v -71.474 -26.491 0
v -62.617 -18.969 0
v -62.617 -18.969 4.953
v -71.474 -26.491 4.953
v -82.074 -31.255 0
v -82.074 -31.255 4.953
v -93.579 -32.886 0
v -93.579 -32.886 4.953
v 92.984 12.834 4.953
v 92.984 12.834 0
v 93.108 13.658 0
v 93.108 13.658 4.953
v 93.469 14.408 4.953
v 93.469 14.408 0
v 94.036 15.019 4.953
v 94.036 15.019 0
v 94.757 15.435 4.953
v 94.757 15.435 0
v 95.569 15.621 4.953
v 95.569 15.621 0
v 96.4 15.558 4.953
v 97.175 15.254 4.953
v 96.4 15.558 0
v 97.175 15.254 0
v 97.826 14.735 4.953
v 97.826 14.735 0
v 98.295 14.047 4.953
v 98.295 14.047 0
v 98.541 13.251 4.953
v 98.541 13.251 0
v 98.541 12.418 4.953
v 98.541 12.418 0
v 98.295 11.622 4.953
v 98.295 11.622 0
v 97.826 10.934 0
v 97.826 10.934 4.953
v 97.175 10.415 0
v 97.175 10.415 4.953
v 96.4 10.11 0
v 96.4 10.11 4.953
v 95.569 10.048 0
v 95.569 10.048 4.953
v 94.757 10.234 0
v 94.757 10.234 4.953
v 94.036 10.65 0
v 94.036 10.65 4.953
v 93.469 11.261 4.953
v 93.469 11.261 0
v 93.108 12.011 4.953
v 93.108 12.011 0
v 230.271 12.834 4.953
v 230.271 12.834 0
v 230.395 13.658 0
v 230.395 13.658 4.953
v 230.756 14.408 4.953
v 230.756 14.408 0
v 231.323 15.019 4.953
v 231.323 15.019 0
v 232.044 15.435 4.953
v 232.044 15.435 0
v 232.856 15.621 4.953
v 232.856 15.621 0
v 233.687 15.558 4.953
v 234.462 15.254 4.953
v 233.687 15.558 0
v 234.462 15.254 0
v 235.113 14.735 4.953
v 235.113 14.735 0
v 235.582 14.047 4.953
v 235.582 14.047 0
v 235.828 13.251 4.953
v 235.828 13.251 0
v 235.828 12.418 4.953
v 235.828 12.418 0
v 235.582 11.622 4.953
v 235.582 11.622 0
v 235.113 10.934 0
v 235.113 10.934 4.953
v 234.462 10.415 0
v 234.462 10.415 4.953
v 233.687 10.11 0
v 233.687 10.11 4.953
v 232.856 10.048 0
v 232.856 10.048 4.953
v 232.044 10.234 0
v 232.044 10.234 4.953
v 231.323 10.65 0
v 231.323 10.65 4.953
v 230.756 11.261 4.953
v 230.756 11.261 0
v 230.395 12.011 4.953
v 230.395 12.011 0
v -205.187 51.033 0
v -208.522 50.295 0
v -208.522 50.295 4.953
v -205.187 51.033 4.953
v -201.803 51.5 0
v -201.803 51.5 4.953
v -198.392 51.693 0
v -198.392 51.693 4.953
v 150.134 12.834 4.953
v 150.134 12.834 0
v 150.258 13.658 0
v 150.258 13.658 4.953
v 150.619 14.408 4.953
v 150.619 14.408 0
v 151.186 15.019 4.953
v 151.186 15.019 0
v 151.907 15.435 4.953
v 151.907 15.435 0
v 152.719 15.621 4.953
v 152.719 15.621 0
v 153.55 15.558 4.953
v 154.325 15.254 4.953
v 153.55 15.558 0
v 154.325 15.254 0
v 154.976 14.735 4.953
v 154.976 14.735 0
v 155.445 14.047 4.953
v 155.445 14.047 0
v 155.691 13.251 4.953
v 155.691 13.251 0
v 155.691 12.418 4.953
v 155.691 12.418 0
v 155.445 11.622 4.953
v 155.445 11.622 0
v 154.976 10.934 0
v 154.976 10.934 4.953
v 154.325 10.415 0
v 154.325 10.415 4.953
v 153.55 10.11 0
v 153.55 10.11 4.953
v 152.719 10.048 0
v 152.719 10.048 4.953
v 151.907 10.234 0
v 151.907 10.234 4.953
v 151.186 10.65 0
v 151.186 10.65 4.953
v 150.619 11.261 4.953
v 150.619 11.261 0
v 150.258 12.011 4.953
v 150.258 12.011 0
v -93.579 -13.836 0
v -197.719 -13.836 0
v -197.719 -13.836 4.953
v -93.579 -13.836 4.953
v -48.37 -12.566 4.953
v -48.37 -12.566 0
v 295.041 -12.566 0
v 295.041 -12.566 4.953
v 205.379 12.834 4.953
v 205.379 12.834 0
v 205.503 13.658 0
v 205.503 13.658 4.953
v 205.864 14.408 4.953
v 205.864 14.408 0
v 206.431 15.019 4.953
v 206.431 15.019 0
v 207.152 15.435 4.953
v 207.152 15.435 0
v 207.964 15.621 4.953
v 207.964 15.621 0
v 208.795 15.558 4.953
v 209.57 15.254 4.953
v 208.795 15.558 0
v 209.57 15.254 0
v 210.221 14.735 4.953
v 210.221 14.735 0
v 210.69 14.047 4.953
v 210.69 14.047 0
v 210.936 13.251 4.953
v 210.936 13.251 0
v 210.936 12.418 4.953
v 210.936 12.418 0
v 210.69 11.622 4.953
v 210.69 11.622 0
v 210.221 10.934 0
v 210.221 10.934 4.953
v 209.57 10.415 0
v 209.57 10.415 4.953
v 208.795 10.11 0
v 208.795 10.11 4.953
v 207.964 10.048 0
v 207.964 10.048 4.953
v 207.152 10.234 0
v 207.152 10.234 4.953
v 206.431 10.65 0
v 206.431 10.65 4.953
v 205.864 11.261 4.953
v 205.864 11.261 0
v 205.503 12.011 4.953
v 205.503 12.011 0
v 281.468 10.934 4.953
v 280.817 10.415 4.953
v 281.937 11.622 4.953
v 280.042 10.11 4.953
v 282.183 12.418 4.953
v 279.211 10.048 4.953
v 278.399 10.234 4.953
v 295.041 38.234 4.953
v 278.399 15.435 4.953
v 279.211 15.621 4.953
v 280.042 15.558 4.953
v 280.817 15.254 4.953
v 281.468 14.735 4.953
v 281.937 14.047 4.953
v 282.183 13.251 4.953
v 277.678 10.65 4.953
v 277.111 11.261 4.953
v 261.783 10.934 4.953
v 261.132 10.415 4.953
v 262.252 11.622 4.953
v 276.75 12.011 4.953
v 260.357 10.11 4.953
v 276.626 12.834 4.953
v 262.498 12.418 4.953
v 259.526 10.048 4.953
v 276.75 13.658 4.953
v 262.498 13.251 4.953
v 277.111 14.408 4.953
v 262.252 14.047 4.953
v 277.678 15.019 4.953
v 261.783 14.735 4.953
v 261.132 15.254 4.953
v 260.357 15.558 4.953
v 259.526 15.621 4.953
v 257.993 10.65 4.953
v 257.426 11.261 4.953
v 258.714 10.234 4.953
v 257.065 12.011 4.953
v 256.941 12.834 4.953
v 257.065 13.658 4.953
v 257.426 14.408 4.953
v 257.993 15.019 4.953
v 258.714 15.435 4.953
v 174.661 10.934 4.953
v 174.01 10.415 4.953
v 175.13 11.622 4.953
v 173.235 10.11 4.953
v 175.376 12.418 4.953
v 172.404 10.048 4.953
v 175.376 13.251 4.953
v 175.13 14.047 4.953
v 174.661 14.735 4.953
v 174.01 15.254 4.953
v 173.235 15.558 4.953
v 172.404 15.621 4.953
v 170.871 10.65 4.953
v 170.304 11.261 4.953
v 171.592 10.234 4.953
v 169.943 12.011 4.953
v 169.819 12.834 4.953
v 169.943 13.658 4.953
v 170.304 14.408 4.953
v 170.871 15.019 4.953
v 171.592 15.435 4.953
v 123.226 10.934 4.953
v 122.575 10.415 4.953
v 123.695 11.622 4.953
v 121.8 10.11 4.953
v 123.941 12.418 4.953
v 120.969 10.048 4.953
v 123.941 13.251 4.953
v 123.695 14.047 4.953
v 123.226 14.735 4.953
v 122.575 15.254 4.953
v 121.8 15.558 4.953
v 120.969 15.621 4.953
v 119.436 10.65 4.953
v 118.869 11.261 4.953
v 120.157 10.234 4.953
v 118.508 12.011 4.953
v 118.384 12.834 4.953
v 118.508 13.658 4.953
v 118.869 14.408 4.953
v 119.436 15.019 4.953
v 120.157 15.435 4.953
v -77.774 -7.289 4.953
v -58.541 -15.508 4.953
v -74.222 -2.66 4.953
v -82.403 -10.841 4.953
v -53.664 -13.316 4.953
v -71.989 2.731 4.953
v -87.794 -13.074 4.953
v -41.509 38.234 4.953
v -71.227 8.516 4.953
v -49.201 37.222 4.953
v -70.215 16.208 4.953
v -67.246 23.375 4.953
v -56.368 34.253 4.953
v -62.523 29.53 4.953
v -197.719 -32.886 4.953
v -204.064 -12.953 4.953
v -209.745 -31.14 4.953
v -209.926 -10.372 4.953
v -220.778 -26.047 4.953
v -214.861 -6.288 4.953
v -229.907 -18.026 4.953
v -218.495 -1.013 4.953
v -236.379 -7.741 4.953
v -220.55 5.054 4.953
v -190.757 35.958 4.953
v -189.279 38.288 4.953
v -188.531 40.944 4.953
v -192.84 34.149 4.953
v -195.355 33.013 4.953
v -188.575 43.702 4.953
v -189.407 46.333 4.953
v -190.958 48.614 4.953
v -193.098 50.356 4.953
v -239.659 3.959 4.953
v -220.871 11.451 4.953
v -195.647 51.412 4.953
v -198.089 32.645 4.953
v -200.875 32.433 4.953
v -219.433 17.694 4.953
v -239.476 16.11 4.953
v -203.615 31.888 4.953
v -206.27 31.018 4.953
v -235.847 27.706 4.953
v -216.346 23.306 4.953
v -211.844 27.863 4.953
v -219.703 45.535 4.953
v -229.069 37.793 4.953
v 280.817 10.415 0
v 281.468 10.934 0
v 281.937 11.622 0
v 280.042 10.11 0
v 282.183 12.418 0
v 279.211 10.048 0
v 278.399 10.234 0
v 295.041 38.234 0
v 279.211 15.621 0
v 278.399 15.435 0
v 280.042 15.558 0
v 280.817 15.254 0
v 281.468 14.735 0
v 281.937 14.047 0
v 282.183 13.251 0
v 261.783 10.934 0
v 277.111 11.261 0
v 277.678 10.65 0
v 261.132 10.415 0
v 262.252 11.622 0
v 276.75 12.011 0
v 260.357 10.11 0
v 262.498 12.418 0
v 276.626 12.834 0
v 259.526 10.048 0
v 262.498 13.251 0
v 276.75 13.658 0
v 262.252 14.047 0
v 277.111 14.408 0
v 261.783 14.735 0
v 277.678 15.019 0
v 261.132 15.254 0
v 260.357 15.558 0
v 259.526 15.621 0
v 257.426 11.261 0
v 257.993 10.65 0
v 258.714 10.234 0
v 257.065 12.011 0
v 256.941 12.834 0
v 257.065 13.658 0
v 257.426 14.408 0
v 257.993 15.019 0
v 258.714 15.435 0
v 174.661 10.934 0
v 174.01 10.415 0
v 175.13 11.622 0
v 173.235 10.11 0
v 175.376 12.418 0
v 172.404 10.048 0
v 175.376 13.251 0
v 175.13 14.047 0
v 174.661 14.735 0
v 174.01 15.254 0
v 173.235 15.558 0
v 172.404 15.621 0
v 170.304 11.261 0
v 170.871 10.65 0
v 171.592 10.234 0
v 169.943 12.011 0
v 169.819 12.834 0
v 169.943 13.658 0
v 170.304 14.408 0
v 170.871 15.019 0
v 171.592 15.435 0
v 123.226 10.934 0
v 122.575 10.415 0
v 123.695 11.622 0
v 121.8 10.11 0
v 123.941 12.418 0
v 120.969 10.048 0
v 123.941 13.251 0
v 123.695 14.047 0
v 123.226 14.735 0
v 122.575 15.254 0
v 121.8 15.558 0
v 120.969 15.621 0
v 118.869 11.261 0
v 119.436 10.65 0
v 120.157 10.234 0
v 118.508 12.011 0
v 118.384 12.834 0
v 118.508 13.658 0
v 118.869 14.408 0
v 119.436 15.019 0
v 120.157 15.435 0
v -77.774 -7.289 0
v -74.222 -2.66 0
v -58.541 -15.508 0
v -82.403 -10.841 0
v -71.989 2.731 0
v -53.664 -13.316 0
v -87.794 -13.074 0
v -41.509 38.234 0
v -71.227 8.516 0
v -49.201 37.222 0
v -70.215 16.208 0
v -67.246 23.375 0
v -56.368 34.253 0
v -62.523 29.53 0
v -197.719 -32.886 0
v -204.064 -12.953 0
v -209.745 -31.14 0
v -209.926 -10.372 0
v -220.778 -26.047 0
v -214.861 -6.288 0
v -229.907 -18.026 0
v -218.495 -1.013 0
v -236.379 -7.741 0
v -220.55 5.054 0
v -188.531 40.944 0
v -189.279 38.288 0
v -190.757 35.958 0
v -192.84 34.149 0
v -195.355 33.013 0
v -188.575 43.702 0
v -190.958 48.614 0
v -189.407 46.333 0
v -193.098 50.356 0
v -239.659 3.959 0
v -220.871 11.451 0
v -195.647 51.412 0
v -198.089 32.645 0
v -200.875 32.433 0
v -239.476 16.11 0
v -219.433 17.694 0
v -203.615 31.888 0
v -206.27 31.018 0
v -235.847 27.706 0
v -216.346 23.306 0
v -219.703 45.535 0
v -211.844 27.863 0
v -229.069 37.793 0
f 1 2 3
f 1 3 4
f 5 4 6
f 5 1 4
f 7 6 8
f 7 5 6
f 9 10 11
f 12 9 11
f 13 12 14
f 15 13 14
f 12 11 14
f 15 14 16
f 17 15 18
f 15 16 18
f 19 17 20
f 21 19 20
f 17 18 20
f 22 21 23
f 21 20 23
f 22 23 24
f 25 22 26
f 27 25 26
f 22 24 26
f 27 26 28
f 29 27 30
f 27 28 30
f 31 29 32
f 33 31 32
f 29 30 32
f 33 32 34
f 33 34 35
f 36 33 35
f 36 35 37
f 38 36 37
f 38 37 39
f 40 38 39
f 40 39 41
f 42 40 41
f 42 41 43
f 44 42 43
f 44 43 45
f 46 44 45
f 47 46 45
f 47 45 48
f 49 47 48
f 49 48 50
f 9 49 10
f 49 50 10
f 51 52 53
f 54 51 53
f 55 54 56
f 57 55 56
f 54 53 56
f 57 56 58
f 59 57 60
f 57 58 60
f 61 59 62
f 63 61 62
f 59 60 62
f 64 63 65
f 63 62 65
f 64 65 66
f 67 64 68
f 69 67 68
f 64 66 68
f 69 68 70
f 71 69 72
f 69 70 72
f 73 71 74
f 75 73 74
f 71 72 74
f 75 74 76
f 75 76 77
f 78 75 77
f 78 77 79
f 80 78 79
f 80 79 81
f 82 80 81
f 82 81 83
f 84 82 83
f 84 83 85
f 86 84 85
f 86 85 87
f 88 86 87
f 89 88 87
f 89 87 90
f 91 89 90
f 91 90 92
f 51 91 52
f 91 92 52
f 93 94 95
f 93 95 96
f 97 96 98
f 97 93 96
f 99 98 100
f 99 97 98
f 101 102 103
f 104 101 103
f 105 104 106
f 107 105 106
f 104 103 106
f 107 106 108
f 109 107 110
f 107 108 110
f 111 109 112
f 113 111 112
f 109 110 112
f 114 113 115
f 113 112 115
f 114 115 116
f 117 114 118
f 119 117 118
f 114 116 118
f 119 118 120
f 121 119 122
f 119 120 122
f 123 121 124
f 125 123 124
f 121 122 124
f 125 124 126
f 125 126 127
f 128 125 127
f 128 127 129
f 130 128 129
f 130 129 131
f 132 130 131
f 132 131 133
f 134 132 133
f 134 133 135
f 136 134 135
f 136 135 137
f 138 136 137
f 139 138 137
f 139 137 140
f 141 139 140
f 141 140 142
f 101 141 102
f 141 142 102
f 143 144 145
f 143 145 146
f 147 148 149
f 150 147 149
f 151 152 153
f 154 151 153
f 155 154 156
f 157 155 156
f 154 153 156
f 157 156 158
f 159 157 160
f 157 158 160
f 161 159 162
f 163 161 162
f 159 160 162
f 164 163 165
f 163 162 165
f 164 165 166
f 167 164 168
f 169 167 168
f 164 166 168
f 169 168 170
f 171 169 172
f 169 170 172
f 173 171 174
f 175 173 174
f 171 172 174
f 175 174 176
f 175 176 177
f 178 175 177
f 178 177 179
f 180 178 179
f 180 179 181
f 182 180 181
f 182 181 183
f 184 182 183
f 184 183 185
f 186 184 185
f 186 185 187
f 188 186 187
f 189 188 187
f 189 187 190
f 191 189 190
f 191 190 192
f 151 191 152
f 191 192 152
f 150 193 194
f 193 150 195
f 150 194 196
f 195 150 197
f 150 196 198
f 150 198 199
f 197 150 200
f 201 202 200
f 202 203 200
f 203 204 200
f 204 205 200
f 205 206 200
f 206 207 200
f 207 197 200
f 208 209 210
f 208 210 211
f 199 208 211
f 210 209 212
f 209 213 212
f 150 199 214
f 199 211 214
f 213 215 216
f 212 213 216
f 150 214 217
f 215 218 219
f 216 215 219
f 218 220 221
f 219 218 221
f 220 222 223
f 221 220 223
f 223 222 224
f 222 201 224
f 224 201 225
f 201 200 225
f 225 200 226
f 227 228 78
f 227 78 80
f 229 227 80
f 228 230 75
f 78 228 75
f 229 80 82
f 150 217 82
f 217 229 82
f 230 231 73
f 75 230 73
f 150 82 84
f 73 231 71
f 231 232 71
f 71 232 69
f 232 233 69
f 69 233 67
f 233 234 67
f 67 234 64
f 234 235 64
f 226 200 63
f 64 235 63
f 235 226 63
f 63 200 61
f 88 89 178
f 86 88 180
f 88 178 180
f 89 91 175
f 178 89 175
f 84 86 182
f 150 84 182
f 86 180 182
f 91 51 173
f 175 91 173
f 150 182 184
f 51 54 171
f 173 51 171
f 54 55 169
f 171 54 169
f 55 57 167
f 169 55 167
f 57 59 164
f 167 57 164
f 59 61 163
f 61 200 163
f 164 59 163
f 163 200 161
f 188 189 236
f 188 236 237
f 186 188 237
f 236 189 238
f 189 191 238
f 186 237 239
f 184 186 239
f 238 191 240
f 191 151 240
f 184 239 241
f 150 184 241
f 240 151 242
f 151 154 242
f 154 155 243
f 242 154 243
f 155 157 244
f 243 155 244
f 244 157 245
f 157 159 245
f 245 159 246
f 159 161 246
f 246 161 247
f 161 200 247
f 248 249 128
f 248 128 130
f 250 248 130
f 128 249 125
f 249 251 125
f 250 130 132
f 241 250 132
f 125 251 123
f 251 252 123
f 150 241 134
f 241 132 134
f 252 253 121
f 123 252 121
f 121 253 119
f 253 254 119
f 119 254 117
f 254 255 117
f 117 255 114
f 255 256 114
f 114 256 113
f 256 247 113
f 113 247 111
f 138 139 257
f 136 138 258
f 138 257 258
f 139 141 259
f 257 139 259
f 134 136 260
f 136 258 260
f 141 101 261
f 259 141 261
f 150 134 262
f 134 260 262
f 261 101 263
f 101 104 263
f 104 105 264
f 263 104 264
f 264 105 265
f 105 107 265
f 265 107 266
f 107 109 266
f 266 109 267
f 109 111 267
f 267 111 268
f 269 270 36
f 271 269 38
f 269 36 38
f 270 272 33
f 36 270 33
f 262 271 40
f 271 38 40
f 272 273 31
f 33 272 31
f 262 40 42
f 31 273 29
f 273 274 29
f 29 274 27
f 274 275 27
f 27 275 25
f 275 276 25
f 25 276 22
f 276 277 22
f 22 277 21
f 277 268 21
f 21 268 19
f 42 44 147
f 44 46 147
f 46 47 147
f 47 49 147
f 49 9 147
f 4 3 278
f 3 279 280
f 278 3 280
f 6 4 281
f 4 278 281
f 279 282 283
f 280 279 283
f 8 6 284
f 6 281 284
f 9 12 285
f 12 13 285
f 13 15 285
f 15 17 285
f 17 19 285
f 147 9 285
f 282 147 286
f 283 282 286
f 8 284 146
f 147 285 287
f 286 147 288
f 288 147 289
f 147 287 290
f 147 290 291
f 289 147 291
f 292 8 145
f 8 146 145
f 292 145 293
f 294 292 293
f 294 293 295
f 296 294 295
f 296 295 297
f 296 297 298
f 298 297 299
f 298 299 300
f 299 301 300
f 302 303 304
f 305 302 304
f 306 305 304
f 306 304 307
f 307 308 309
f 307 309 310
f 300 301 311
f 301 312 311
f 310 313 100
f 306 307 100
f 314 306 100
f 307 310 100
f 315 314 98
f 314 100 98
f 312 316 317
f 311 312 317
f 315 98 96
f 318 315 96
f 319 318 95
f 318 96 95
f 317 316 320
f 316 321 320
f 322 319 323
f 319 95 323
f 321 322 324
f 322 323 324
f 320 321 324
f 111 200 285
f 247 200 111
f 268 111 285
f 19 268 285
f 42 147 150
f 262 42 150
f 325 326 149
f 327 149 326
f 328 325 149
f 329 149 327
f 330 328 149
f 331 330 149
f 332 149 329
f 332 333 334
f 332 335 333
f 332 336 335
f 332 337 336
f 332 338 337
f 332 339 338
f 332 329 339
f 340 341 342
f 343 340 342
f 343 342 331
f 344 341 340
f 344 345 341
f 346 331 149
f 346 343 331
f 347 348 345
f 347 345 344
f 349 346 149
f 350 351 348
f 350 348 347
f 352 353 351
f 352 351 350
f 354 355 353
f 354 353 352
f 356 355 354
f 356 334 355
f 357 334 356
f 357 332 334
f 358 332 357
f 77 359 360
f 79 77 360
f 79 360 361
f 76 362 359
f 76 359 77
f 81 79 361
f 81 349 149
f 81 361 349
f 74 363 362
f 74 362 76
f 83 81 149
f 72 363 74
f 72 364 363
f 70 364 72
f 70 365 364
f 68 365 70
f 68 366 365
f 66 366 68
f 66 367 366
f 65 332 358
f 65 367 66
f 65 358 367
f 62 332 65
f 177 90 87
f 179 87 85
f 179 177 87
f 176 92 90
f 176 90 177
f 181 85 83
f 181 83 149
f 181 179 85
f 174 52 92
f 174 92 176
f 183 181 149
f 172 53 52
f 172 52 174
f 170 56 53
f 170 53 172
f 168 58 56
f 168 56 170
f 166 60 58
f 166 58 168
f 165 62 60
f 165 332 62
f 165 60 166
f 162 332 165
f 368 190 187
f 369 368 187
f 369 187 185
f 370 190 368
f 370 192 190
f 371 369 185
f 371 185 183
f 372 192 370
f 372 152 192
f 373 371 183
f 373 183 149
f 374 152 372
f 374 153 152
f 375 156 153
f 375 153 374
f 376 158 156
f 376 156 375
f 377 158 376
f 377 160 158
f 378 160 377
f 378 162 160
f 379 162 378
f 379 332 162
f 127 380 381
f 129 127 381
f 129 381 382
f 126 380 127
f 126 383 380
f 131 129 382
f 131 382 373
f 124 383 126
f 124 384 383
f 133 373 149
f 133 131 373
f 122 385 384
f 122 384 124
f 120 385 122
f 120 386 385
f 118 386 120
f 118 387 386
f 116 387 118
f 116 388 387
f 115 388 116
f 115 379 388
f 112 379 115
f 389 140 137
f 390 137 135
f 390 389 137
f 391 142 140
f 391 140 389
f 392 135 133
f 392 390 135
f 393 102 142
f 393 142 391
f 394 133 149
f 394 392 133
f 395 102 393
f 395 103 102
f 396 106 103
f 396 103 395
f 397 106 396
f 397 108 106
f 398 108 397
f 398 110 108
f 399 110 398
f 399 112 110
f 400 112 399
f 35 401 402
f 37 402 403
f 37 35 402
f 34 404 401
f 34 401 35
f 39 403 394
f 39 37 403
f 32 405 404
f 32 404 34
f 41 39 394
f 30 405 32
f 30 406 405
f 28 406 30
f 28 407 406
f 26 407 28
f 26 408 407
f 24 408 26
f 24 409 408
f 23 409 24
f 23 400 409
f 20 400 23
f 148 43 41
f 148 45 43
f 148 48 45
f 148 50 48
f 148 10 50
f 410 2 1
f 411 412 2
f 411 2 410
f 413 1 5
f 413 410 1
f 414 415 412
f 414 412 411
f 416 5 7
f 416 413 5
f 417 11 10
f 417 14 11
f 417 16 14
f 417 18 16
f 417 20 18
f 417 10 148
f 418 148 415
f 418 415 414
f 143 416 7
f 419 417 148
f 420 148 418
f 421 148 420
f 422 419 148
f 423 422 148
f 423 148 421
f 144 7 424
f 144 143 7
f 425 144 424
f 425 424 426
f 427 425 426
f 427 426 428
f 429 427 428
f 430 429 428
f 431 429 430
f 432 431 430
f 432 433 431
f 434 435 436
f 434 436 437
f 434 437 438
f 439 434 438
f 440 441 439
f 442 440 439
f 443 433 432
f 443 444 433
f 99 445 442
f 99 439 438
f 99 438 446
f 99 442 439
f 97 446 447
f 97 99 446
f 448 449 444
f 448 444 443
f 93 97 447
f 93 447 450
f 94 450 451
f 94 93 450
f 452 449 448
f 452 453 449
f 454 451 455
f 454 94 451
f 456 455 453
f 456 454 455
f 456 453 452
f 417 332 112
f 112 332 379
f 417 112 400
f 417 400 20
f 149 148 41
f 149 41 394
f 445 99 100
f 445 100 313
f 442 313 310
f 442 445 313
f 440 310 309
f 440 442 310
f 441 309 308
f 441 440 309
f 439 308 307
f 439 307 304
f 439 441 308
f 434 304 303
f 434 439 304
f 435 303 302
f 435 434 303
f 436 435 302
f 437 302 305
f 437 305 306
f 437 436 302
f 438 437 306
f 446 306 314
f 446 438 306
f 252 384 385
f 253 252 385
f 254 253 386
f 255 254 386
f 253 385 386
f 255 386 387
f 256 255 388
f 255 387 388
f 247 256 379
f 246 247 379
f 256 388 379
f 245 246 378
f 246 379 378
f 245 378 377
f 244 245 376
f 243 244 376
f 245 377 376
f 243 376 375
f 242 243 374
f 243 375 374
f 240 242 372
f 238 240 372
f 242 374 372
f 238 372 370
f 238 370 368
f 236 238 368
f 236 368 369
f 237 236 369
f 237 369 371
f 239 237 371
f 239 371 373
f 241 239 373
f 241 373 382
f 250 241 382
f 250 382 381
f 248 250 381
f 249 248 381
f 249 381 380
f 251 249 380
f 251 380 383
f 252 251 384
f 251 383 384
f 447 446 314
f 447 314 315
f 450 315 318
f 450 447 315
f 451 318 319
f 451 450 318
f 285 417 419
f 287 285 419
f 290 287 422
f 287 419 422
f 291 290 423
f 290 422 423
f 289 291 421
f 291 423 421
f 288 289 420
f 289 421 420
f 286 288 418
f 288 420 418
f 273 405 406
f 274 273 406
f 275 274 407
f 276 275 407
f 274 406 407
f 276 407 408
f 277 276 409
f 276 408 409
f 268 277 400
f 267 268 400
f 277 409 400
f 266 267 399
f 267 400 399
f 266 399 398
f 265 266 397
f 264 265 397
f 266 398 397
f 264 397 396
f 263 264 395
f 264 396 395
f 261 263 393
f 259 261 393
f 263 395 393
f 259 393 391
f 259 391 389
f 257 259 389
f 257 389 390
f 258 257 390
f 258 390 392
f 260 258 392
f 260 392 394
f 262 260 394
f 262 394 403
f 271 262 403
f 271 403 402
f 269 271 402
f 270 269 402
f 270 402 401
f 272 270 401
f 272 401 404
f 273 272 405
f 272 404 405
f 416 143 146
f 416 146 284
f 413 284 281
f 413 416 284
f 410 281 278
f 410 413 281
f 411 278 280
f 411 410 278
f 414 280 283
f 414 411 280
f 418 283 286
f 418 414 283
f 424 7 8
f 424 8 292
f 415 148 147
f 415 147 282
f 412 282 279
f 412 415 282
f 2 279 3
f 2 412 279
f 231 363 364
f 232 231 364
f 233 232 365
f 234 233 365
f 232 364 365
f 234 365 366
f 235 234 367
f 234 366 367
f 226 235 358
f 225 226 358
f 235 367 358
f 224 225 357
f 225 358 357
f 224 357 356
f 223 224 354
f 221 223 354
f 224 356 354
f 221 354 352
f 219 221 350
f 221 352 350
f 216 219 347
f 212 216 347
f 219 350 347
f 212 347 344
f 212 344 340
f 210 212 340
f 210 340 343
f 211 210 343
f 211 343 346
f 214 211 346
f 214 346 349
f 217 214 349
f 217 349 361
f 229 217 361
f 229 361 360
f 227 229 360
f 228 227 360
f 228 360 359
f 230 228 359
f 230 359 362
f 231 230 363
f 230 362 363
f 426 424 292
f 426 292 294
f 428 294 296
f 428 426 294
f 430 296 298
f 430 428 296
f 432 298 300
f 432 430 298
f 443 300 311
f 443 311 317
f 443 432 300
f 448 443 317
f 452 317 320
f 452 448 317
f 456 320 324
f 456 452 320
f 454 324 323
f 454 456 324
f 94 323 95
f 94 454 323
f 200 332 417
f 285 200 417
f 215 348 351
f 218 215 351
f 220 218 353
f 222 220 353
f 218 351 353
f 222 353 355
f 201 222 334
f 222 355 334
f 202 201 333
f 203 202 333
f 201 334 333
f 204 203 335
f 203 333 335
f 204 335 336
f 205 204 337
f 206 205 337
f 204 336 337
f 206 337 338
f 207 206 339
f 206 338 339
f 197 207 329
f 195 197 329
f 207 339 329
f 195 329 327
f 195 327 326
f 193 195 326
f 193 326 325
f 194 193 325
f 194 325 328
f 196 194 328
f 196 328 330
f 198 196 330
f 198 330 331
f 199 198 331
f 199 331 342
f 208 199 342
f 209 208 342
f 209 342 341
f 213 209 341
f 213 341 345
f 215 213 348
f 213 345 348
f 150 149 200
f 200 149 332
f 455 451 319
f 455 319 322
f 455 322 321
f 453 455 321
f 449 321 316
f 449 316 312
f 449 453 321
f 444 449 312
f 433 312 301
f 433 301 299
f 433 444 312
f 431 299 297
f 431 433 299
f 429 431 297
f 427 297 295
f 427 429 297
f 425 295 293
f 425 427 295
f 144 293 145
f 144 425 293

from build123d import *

# Parameters (mm, degrees)
BOSS_EXTRUDE1_DEPTH = 4.953
SKETCH4_W           = 52.07
SKETCH4_H           = 19.05
SKETCH4_R           = 9.528566475
BOSS_EXTRUDE4_DEPTH = 4.953
SKETCH5_R           = 2.794
CUT_EXTRUDE1_DEPTH  = 4.953


with BuildPart() as part:
    # Sketch1 → Boss-Extrude1 (new body)
    with BuildSketch(Plane.XY):
        with BuildLine():
            Line((-41.509205492, 38.23442277), (-41.509205492, -12.56557723))
            Line((-41.509205492, -12.56557723), (-20.563828914, -12.56557723))
            ThreePointArc((-20.563828914, -12.56557723), (-14.071874854, -2.900775285), (-11.791205492, 8.51642277))
            ThreePointArc((-11.791205492, 8.51642277), (-20.495406169, 29.530222094), (-41.509205492, 38.23442277))
        make_face()
        with BuildLine():
            Line((-62.45458207, -12.56557723), (-41.509205492, -12.56557723))
            Line((-41.509205492, -12.56557723), (-41.509205492, 38.23442277))
            ThreePointArc((-41.509205492, 38.23442277), (-62.523004816, 29.530222094), (-71.227205492, 8.51642277))
            ThreePointArc((-71.227205492, 8.51642277), (-68.946536131, -2.900775285), (-62.45458207, -12.56557723))
        make_face()
        with BuildLine():
            ThreePointArc((-11.791205492, 8.51642277), (-14.071874854, -2.900775285), (-20.563828914, -12.56557723))
            Line((-20.563828914, -12.56557723), (9.711739651, -12.56557723))
            Line((9.711739651, -12.56557723), (295.040794508, -12.56557723))
            Line((295.040794508, -12.56557723), (295.040794508, 38.23442277))
            Line((295.040794508, 38.23442277), (-41.509205492, 38.23442277))
            ThreePointArc((-41.509205492, 38.23442277), (-20.495406169, 29.530222094), (-11.791205492, 8.51642277))
        make_face()
        with BuildLine():
            Line((-71.227205492, -12.56557723), (-62.45458207, -12.56557723))
            ThreePointArc((-62.45458207, -12.56557723), (-68.946536131, -2.900775285), (-71.227205492, 8.51642277))
            Line((-71.227205492, 8.51642277), (-71.227205492, -12.56557723))
        make_face()
    extrude(amount=BOSS_EXTRUDE1_DEPTH)

    # Sketch4 → Boss-Extrude4 (add)
    with BuildSketch(Plane(origin=(0, 0, 0), x_dir=(-1, 0, 0), z_dir=(0, 0, -1))):
        with Locations((171.684205492, -23.36057723)):
            Rectangle(SKETCH4_W, SKETCH4_H)
        with BuildLine():
            Line((145.649205492, -13.83557723), (93.579205492, -13.83557723))
            ThreePointArc((93.579205492, -13.83557723), (77.773954719, -7.288828003), (71.227205492, 8.51642277))
            Line((71.227205492, 8.51642277), (71.227205492, -12.56557723))
            Line((71.227205492, -12.56557723), (48.370059515, -12.56557723))
            ThreePointArc((48.370059515, -12.56557723), (56.179798103, -14.24000578), (62.61663913, -18.968938574))
            ThreePointArc((62.61663913, -18.968938574), (76.606040295, -29.246485846), (93.579205492, -32.88557723))
            Line((93.579205492, -32.88557723), (145.649205492, -32.88557723))
            Line((145.649205492, -32.88557723), (145.649205492, -13.83557723))
        make_face()
        with BuildLine():
            ThreePointArc((206.26970661, 31.017935339), (220.549824511, 5.053937718), (197.719205492, -13.83557723))
            Line((197.719205492, -13.83557723), (197.719205492, -32.88557723))
            ThreePointArc((197.719205492, -32.88557723), (239.658720339, 3.959196789), (208.522432887, 50.294840539))
            Line((208.522432887, 50.294840539), (207.444047034, 41.066936521))
            Line((207.444047034, 41.066936521), (206.26970661, 31.017935339))
        make_face()
        with Locations((197.979885508, 42.172931859)):
            Circle(SKETCH4_R)
        with BuildLine():
            Line((207.444047034, 41.066936521), (208.522432887, 50.294840539))
            ThreePointArc((208.522432887, 50.294840539), (203.499658151, 51.301032243), (198.392077595, 51.69257874))
            ThreePointArc((198.392077595, 51.69257874), (204.861788543, 48.763302841), (207.508451983, 42.172931859))
            ThreePointArc((207.508451983, 42.172931859), (207.492337119, 41.618997367), (207.444047034, 41.066936521))
        make_face()
        with BuildLine():
            ThreePointArc((198.088987461, 32.644990012), (202.252933463, 32.201450179), (206.26970661, 31.017935339))
            Line((206.26970661, 31.017935339), (207.444047034, 41.066936521))
            ThreePointArc((207.444047034, 41.066936521), (204.355161122, 35.091304933), (198.088987461, 32.644990012))
        make_face()
    extrude(amount=-BOSS_EXTRUDE4_DEPTH)

    # Sketch5 → Cut-Extrude1 (cut)
    with BuildSketch(Plane(origin=(0, 0, 0), x_dir=(-1, 0, 0), z_dir=(0, 0, -1))):
        with Locations((-279.419794508, 12.83442277)):
            Circle(SKETCH5_R)
        with Locations((-259.734794508, 12.83442277)):
            Circle(SKETCH5_R)
        with Locations((-233.064794508, 12.83442277)):
            Circle(SKETCH5_R)
        with Locations((-208.172794508, 12.83442277)):
            Circle(SKETCH5_R)
        with Locations((-172.612794508, 12.83442277)):
            Circle(SKETCH5_R)
        with Locations((-152.927794508, 12.83442277)):
            Circle(SKETCH5_R)
        with Locations((-121.177794508, 12.83442277)):
            Circle(SKETCH5_R)
        with Locations((-95.777794508, 12.83442277)):
            Circle(SKETCH5_R)
    extrude(amount=-CUT_EXTRUDE1_DEPTH, mode=Mode.SUBTRACT)


solid = part.part
